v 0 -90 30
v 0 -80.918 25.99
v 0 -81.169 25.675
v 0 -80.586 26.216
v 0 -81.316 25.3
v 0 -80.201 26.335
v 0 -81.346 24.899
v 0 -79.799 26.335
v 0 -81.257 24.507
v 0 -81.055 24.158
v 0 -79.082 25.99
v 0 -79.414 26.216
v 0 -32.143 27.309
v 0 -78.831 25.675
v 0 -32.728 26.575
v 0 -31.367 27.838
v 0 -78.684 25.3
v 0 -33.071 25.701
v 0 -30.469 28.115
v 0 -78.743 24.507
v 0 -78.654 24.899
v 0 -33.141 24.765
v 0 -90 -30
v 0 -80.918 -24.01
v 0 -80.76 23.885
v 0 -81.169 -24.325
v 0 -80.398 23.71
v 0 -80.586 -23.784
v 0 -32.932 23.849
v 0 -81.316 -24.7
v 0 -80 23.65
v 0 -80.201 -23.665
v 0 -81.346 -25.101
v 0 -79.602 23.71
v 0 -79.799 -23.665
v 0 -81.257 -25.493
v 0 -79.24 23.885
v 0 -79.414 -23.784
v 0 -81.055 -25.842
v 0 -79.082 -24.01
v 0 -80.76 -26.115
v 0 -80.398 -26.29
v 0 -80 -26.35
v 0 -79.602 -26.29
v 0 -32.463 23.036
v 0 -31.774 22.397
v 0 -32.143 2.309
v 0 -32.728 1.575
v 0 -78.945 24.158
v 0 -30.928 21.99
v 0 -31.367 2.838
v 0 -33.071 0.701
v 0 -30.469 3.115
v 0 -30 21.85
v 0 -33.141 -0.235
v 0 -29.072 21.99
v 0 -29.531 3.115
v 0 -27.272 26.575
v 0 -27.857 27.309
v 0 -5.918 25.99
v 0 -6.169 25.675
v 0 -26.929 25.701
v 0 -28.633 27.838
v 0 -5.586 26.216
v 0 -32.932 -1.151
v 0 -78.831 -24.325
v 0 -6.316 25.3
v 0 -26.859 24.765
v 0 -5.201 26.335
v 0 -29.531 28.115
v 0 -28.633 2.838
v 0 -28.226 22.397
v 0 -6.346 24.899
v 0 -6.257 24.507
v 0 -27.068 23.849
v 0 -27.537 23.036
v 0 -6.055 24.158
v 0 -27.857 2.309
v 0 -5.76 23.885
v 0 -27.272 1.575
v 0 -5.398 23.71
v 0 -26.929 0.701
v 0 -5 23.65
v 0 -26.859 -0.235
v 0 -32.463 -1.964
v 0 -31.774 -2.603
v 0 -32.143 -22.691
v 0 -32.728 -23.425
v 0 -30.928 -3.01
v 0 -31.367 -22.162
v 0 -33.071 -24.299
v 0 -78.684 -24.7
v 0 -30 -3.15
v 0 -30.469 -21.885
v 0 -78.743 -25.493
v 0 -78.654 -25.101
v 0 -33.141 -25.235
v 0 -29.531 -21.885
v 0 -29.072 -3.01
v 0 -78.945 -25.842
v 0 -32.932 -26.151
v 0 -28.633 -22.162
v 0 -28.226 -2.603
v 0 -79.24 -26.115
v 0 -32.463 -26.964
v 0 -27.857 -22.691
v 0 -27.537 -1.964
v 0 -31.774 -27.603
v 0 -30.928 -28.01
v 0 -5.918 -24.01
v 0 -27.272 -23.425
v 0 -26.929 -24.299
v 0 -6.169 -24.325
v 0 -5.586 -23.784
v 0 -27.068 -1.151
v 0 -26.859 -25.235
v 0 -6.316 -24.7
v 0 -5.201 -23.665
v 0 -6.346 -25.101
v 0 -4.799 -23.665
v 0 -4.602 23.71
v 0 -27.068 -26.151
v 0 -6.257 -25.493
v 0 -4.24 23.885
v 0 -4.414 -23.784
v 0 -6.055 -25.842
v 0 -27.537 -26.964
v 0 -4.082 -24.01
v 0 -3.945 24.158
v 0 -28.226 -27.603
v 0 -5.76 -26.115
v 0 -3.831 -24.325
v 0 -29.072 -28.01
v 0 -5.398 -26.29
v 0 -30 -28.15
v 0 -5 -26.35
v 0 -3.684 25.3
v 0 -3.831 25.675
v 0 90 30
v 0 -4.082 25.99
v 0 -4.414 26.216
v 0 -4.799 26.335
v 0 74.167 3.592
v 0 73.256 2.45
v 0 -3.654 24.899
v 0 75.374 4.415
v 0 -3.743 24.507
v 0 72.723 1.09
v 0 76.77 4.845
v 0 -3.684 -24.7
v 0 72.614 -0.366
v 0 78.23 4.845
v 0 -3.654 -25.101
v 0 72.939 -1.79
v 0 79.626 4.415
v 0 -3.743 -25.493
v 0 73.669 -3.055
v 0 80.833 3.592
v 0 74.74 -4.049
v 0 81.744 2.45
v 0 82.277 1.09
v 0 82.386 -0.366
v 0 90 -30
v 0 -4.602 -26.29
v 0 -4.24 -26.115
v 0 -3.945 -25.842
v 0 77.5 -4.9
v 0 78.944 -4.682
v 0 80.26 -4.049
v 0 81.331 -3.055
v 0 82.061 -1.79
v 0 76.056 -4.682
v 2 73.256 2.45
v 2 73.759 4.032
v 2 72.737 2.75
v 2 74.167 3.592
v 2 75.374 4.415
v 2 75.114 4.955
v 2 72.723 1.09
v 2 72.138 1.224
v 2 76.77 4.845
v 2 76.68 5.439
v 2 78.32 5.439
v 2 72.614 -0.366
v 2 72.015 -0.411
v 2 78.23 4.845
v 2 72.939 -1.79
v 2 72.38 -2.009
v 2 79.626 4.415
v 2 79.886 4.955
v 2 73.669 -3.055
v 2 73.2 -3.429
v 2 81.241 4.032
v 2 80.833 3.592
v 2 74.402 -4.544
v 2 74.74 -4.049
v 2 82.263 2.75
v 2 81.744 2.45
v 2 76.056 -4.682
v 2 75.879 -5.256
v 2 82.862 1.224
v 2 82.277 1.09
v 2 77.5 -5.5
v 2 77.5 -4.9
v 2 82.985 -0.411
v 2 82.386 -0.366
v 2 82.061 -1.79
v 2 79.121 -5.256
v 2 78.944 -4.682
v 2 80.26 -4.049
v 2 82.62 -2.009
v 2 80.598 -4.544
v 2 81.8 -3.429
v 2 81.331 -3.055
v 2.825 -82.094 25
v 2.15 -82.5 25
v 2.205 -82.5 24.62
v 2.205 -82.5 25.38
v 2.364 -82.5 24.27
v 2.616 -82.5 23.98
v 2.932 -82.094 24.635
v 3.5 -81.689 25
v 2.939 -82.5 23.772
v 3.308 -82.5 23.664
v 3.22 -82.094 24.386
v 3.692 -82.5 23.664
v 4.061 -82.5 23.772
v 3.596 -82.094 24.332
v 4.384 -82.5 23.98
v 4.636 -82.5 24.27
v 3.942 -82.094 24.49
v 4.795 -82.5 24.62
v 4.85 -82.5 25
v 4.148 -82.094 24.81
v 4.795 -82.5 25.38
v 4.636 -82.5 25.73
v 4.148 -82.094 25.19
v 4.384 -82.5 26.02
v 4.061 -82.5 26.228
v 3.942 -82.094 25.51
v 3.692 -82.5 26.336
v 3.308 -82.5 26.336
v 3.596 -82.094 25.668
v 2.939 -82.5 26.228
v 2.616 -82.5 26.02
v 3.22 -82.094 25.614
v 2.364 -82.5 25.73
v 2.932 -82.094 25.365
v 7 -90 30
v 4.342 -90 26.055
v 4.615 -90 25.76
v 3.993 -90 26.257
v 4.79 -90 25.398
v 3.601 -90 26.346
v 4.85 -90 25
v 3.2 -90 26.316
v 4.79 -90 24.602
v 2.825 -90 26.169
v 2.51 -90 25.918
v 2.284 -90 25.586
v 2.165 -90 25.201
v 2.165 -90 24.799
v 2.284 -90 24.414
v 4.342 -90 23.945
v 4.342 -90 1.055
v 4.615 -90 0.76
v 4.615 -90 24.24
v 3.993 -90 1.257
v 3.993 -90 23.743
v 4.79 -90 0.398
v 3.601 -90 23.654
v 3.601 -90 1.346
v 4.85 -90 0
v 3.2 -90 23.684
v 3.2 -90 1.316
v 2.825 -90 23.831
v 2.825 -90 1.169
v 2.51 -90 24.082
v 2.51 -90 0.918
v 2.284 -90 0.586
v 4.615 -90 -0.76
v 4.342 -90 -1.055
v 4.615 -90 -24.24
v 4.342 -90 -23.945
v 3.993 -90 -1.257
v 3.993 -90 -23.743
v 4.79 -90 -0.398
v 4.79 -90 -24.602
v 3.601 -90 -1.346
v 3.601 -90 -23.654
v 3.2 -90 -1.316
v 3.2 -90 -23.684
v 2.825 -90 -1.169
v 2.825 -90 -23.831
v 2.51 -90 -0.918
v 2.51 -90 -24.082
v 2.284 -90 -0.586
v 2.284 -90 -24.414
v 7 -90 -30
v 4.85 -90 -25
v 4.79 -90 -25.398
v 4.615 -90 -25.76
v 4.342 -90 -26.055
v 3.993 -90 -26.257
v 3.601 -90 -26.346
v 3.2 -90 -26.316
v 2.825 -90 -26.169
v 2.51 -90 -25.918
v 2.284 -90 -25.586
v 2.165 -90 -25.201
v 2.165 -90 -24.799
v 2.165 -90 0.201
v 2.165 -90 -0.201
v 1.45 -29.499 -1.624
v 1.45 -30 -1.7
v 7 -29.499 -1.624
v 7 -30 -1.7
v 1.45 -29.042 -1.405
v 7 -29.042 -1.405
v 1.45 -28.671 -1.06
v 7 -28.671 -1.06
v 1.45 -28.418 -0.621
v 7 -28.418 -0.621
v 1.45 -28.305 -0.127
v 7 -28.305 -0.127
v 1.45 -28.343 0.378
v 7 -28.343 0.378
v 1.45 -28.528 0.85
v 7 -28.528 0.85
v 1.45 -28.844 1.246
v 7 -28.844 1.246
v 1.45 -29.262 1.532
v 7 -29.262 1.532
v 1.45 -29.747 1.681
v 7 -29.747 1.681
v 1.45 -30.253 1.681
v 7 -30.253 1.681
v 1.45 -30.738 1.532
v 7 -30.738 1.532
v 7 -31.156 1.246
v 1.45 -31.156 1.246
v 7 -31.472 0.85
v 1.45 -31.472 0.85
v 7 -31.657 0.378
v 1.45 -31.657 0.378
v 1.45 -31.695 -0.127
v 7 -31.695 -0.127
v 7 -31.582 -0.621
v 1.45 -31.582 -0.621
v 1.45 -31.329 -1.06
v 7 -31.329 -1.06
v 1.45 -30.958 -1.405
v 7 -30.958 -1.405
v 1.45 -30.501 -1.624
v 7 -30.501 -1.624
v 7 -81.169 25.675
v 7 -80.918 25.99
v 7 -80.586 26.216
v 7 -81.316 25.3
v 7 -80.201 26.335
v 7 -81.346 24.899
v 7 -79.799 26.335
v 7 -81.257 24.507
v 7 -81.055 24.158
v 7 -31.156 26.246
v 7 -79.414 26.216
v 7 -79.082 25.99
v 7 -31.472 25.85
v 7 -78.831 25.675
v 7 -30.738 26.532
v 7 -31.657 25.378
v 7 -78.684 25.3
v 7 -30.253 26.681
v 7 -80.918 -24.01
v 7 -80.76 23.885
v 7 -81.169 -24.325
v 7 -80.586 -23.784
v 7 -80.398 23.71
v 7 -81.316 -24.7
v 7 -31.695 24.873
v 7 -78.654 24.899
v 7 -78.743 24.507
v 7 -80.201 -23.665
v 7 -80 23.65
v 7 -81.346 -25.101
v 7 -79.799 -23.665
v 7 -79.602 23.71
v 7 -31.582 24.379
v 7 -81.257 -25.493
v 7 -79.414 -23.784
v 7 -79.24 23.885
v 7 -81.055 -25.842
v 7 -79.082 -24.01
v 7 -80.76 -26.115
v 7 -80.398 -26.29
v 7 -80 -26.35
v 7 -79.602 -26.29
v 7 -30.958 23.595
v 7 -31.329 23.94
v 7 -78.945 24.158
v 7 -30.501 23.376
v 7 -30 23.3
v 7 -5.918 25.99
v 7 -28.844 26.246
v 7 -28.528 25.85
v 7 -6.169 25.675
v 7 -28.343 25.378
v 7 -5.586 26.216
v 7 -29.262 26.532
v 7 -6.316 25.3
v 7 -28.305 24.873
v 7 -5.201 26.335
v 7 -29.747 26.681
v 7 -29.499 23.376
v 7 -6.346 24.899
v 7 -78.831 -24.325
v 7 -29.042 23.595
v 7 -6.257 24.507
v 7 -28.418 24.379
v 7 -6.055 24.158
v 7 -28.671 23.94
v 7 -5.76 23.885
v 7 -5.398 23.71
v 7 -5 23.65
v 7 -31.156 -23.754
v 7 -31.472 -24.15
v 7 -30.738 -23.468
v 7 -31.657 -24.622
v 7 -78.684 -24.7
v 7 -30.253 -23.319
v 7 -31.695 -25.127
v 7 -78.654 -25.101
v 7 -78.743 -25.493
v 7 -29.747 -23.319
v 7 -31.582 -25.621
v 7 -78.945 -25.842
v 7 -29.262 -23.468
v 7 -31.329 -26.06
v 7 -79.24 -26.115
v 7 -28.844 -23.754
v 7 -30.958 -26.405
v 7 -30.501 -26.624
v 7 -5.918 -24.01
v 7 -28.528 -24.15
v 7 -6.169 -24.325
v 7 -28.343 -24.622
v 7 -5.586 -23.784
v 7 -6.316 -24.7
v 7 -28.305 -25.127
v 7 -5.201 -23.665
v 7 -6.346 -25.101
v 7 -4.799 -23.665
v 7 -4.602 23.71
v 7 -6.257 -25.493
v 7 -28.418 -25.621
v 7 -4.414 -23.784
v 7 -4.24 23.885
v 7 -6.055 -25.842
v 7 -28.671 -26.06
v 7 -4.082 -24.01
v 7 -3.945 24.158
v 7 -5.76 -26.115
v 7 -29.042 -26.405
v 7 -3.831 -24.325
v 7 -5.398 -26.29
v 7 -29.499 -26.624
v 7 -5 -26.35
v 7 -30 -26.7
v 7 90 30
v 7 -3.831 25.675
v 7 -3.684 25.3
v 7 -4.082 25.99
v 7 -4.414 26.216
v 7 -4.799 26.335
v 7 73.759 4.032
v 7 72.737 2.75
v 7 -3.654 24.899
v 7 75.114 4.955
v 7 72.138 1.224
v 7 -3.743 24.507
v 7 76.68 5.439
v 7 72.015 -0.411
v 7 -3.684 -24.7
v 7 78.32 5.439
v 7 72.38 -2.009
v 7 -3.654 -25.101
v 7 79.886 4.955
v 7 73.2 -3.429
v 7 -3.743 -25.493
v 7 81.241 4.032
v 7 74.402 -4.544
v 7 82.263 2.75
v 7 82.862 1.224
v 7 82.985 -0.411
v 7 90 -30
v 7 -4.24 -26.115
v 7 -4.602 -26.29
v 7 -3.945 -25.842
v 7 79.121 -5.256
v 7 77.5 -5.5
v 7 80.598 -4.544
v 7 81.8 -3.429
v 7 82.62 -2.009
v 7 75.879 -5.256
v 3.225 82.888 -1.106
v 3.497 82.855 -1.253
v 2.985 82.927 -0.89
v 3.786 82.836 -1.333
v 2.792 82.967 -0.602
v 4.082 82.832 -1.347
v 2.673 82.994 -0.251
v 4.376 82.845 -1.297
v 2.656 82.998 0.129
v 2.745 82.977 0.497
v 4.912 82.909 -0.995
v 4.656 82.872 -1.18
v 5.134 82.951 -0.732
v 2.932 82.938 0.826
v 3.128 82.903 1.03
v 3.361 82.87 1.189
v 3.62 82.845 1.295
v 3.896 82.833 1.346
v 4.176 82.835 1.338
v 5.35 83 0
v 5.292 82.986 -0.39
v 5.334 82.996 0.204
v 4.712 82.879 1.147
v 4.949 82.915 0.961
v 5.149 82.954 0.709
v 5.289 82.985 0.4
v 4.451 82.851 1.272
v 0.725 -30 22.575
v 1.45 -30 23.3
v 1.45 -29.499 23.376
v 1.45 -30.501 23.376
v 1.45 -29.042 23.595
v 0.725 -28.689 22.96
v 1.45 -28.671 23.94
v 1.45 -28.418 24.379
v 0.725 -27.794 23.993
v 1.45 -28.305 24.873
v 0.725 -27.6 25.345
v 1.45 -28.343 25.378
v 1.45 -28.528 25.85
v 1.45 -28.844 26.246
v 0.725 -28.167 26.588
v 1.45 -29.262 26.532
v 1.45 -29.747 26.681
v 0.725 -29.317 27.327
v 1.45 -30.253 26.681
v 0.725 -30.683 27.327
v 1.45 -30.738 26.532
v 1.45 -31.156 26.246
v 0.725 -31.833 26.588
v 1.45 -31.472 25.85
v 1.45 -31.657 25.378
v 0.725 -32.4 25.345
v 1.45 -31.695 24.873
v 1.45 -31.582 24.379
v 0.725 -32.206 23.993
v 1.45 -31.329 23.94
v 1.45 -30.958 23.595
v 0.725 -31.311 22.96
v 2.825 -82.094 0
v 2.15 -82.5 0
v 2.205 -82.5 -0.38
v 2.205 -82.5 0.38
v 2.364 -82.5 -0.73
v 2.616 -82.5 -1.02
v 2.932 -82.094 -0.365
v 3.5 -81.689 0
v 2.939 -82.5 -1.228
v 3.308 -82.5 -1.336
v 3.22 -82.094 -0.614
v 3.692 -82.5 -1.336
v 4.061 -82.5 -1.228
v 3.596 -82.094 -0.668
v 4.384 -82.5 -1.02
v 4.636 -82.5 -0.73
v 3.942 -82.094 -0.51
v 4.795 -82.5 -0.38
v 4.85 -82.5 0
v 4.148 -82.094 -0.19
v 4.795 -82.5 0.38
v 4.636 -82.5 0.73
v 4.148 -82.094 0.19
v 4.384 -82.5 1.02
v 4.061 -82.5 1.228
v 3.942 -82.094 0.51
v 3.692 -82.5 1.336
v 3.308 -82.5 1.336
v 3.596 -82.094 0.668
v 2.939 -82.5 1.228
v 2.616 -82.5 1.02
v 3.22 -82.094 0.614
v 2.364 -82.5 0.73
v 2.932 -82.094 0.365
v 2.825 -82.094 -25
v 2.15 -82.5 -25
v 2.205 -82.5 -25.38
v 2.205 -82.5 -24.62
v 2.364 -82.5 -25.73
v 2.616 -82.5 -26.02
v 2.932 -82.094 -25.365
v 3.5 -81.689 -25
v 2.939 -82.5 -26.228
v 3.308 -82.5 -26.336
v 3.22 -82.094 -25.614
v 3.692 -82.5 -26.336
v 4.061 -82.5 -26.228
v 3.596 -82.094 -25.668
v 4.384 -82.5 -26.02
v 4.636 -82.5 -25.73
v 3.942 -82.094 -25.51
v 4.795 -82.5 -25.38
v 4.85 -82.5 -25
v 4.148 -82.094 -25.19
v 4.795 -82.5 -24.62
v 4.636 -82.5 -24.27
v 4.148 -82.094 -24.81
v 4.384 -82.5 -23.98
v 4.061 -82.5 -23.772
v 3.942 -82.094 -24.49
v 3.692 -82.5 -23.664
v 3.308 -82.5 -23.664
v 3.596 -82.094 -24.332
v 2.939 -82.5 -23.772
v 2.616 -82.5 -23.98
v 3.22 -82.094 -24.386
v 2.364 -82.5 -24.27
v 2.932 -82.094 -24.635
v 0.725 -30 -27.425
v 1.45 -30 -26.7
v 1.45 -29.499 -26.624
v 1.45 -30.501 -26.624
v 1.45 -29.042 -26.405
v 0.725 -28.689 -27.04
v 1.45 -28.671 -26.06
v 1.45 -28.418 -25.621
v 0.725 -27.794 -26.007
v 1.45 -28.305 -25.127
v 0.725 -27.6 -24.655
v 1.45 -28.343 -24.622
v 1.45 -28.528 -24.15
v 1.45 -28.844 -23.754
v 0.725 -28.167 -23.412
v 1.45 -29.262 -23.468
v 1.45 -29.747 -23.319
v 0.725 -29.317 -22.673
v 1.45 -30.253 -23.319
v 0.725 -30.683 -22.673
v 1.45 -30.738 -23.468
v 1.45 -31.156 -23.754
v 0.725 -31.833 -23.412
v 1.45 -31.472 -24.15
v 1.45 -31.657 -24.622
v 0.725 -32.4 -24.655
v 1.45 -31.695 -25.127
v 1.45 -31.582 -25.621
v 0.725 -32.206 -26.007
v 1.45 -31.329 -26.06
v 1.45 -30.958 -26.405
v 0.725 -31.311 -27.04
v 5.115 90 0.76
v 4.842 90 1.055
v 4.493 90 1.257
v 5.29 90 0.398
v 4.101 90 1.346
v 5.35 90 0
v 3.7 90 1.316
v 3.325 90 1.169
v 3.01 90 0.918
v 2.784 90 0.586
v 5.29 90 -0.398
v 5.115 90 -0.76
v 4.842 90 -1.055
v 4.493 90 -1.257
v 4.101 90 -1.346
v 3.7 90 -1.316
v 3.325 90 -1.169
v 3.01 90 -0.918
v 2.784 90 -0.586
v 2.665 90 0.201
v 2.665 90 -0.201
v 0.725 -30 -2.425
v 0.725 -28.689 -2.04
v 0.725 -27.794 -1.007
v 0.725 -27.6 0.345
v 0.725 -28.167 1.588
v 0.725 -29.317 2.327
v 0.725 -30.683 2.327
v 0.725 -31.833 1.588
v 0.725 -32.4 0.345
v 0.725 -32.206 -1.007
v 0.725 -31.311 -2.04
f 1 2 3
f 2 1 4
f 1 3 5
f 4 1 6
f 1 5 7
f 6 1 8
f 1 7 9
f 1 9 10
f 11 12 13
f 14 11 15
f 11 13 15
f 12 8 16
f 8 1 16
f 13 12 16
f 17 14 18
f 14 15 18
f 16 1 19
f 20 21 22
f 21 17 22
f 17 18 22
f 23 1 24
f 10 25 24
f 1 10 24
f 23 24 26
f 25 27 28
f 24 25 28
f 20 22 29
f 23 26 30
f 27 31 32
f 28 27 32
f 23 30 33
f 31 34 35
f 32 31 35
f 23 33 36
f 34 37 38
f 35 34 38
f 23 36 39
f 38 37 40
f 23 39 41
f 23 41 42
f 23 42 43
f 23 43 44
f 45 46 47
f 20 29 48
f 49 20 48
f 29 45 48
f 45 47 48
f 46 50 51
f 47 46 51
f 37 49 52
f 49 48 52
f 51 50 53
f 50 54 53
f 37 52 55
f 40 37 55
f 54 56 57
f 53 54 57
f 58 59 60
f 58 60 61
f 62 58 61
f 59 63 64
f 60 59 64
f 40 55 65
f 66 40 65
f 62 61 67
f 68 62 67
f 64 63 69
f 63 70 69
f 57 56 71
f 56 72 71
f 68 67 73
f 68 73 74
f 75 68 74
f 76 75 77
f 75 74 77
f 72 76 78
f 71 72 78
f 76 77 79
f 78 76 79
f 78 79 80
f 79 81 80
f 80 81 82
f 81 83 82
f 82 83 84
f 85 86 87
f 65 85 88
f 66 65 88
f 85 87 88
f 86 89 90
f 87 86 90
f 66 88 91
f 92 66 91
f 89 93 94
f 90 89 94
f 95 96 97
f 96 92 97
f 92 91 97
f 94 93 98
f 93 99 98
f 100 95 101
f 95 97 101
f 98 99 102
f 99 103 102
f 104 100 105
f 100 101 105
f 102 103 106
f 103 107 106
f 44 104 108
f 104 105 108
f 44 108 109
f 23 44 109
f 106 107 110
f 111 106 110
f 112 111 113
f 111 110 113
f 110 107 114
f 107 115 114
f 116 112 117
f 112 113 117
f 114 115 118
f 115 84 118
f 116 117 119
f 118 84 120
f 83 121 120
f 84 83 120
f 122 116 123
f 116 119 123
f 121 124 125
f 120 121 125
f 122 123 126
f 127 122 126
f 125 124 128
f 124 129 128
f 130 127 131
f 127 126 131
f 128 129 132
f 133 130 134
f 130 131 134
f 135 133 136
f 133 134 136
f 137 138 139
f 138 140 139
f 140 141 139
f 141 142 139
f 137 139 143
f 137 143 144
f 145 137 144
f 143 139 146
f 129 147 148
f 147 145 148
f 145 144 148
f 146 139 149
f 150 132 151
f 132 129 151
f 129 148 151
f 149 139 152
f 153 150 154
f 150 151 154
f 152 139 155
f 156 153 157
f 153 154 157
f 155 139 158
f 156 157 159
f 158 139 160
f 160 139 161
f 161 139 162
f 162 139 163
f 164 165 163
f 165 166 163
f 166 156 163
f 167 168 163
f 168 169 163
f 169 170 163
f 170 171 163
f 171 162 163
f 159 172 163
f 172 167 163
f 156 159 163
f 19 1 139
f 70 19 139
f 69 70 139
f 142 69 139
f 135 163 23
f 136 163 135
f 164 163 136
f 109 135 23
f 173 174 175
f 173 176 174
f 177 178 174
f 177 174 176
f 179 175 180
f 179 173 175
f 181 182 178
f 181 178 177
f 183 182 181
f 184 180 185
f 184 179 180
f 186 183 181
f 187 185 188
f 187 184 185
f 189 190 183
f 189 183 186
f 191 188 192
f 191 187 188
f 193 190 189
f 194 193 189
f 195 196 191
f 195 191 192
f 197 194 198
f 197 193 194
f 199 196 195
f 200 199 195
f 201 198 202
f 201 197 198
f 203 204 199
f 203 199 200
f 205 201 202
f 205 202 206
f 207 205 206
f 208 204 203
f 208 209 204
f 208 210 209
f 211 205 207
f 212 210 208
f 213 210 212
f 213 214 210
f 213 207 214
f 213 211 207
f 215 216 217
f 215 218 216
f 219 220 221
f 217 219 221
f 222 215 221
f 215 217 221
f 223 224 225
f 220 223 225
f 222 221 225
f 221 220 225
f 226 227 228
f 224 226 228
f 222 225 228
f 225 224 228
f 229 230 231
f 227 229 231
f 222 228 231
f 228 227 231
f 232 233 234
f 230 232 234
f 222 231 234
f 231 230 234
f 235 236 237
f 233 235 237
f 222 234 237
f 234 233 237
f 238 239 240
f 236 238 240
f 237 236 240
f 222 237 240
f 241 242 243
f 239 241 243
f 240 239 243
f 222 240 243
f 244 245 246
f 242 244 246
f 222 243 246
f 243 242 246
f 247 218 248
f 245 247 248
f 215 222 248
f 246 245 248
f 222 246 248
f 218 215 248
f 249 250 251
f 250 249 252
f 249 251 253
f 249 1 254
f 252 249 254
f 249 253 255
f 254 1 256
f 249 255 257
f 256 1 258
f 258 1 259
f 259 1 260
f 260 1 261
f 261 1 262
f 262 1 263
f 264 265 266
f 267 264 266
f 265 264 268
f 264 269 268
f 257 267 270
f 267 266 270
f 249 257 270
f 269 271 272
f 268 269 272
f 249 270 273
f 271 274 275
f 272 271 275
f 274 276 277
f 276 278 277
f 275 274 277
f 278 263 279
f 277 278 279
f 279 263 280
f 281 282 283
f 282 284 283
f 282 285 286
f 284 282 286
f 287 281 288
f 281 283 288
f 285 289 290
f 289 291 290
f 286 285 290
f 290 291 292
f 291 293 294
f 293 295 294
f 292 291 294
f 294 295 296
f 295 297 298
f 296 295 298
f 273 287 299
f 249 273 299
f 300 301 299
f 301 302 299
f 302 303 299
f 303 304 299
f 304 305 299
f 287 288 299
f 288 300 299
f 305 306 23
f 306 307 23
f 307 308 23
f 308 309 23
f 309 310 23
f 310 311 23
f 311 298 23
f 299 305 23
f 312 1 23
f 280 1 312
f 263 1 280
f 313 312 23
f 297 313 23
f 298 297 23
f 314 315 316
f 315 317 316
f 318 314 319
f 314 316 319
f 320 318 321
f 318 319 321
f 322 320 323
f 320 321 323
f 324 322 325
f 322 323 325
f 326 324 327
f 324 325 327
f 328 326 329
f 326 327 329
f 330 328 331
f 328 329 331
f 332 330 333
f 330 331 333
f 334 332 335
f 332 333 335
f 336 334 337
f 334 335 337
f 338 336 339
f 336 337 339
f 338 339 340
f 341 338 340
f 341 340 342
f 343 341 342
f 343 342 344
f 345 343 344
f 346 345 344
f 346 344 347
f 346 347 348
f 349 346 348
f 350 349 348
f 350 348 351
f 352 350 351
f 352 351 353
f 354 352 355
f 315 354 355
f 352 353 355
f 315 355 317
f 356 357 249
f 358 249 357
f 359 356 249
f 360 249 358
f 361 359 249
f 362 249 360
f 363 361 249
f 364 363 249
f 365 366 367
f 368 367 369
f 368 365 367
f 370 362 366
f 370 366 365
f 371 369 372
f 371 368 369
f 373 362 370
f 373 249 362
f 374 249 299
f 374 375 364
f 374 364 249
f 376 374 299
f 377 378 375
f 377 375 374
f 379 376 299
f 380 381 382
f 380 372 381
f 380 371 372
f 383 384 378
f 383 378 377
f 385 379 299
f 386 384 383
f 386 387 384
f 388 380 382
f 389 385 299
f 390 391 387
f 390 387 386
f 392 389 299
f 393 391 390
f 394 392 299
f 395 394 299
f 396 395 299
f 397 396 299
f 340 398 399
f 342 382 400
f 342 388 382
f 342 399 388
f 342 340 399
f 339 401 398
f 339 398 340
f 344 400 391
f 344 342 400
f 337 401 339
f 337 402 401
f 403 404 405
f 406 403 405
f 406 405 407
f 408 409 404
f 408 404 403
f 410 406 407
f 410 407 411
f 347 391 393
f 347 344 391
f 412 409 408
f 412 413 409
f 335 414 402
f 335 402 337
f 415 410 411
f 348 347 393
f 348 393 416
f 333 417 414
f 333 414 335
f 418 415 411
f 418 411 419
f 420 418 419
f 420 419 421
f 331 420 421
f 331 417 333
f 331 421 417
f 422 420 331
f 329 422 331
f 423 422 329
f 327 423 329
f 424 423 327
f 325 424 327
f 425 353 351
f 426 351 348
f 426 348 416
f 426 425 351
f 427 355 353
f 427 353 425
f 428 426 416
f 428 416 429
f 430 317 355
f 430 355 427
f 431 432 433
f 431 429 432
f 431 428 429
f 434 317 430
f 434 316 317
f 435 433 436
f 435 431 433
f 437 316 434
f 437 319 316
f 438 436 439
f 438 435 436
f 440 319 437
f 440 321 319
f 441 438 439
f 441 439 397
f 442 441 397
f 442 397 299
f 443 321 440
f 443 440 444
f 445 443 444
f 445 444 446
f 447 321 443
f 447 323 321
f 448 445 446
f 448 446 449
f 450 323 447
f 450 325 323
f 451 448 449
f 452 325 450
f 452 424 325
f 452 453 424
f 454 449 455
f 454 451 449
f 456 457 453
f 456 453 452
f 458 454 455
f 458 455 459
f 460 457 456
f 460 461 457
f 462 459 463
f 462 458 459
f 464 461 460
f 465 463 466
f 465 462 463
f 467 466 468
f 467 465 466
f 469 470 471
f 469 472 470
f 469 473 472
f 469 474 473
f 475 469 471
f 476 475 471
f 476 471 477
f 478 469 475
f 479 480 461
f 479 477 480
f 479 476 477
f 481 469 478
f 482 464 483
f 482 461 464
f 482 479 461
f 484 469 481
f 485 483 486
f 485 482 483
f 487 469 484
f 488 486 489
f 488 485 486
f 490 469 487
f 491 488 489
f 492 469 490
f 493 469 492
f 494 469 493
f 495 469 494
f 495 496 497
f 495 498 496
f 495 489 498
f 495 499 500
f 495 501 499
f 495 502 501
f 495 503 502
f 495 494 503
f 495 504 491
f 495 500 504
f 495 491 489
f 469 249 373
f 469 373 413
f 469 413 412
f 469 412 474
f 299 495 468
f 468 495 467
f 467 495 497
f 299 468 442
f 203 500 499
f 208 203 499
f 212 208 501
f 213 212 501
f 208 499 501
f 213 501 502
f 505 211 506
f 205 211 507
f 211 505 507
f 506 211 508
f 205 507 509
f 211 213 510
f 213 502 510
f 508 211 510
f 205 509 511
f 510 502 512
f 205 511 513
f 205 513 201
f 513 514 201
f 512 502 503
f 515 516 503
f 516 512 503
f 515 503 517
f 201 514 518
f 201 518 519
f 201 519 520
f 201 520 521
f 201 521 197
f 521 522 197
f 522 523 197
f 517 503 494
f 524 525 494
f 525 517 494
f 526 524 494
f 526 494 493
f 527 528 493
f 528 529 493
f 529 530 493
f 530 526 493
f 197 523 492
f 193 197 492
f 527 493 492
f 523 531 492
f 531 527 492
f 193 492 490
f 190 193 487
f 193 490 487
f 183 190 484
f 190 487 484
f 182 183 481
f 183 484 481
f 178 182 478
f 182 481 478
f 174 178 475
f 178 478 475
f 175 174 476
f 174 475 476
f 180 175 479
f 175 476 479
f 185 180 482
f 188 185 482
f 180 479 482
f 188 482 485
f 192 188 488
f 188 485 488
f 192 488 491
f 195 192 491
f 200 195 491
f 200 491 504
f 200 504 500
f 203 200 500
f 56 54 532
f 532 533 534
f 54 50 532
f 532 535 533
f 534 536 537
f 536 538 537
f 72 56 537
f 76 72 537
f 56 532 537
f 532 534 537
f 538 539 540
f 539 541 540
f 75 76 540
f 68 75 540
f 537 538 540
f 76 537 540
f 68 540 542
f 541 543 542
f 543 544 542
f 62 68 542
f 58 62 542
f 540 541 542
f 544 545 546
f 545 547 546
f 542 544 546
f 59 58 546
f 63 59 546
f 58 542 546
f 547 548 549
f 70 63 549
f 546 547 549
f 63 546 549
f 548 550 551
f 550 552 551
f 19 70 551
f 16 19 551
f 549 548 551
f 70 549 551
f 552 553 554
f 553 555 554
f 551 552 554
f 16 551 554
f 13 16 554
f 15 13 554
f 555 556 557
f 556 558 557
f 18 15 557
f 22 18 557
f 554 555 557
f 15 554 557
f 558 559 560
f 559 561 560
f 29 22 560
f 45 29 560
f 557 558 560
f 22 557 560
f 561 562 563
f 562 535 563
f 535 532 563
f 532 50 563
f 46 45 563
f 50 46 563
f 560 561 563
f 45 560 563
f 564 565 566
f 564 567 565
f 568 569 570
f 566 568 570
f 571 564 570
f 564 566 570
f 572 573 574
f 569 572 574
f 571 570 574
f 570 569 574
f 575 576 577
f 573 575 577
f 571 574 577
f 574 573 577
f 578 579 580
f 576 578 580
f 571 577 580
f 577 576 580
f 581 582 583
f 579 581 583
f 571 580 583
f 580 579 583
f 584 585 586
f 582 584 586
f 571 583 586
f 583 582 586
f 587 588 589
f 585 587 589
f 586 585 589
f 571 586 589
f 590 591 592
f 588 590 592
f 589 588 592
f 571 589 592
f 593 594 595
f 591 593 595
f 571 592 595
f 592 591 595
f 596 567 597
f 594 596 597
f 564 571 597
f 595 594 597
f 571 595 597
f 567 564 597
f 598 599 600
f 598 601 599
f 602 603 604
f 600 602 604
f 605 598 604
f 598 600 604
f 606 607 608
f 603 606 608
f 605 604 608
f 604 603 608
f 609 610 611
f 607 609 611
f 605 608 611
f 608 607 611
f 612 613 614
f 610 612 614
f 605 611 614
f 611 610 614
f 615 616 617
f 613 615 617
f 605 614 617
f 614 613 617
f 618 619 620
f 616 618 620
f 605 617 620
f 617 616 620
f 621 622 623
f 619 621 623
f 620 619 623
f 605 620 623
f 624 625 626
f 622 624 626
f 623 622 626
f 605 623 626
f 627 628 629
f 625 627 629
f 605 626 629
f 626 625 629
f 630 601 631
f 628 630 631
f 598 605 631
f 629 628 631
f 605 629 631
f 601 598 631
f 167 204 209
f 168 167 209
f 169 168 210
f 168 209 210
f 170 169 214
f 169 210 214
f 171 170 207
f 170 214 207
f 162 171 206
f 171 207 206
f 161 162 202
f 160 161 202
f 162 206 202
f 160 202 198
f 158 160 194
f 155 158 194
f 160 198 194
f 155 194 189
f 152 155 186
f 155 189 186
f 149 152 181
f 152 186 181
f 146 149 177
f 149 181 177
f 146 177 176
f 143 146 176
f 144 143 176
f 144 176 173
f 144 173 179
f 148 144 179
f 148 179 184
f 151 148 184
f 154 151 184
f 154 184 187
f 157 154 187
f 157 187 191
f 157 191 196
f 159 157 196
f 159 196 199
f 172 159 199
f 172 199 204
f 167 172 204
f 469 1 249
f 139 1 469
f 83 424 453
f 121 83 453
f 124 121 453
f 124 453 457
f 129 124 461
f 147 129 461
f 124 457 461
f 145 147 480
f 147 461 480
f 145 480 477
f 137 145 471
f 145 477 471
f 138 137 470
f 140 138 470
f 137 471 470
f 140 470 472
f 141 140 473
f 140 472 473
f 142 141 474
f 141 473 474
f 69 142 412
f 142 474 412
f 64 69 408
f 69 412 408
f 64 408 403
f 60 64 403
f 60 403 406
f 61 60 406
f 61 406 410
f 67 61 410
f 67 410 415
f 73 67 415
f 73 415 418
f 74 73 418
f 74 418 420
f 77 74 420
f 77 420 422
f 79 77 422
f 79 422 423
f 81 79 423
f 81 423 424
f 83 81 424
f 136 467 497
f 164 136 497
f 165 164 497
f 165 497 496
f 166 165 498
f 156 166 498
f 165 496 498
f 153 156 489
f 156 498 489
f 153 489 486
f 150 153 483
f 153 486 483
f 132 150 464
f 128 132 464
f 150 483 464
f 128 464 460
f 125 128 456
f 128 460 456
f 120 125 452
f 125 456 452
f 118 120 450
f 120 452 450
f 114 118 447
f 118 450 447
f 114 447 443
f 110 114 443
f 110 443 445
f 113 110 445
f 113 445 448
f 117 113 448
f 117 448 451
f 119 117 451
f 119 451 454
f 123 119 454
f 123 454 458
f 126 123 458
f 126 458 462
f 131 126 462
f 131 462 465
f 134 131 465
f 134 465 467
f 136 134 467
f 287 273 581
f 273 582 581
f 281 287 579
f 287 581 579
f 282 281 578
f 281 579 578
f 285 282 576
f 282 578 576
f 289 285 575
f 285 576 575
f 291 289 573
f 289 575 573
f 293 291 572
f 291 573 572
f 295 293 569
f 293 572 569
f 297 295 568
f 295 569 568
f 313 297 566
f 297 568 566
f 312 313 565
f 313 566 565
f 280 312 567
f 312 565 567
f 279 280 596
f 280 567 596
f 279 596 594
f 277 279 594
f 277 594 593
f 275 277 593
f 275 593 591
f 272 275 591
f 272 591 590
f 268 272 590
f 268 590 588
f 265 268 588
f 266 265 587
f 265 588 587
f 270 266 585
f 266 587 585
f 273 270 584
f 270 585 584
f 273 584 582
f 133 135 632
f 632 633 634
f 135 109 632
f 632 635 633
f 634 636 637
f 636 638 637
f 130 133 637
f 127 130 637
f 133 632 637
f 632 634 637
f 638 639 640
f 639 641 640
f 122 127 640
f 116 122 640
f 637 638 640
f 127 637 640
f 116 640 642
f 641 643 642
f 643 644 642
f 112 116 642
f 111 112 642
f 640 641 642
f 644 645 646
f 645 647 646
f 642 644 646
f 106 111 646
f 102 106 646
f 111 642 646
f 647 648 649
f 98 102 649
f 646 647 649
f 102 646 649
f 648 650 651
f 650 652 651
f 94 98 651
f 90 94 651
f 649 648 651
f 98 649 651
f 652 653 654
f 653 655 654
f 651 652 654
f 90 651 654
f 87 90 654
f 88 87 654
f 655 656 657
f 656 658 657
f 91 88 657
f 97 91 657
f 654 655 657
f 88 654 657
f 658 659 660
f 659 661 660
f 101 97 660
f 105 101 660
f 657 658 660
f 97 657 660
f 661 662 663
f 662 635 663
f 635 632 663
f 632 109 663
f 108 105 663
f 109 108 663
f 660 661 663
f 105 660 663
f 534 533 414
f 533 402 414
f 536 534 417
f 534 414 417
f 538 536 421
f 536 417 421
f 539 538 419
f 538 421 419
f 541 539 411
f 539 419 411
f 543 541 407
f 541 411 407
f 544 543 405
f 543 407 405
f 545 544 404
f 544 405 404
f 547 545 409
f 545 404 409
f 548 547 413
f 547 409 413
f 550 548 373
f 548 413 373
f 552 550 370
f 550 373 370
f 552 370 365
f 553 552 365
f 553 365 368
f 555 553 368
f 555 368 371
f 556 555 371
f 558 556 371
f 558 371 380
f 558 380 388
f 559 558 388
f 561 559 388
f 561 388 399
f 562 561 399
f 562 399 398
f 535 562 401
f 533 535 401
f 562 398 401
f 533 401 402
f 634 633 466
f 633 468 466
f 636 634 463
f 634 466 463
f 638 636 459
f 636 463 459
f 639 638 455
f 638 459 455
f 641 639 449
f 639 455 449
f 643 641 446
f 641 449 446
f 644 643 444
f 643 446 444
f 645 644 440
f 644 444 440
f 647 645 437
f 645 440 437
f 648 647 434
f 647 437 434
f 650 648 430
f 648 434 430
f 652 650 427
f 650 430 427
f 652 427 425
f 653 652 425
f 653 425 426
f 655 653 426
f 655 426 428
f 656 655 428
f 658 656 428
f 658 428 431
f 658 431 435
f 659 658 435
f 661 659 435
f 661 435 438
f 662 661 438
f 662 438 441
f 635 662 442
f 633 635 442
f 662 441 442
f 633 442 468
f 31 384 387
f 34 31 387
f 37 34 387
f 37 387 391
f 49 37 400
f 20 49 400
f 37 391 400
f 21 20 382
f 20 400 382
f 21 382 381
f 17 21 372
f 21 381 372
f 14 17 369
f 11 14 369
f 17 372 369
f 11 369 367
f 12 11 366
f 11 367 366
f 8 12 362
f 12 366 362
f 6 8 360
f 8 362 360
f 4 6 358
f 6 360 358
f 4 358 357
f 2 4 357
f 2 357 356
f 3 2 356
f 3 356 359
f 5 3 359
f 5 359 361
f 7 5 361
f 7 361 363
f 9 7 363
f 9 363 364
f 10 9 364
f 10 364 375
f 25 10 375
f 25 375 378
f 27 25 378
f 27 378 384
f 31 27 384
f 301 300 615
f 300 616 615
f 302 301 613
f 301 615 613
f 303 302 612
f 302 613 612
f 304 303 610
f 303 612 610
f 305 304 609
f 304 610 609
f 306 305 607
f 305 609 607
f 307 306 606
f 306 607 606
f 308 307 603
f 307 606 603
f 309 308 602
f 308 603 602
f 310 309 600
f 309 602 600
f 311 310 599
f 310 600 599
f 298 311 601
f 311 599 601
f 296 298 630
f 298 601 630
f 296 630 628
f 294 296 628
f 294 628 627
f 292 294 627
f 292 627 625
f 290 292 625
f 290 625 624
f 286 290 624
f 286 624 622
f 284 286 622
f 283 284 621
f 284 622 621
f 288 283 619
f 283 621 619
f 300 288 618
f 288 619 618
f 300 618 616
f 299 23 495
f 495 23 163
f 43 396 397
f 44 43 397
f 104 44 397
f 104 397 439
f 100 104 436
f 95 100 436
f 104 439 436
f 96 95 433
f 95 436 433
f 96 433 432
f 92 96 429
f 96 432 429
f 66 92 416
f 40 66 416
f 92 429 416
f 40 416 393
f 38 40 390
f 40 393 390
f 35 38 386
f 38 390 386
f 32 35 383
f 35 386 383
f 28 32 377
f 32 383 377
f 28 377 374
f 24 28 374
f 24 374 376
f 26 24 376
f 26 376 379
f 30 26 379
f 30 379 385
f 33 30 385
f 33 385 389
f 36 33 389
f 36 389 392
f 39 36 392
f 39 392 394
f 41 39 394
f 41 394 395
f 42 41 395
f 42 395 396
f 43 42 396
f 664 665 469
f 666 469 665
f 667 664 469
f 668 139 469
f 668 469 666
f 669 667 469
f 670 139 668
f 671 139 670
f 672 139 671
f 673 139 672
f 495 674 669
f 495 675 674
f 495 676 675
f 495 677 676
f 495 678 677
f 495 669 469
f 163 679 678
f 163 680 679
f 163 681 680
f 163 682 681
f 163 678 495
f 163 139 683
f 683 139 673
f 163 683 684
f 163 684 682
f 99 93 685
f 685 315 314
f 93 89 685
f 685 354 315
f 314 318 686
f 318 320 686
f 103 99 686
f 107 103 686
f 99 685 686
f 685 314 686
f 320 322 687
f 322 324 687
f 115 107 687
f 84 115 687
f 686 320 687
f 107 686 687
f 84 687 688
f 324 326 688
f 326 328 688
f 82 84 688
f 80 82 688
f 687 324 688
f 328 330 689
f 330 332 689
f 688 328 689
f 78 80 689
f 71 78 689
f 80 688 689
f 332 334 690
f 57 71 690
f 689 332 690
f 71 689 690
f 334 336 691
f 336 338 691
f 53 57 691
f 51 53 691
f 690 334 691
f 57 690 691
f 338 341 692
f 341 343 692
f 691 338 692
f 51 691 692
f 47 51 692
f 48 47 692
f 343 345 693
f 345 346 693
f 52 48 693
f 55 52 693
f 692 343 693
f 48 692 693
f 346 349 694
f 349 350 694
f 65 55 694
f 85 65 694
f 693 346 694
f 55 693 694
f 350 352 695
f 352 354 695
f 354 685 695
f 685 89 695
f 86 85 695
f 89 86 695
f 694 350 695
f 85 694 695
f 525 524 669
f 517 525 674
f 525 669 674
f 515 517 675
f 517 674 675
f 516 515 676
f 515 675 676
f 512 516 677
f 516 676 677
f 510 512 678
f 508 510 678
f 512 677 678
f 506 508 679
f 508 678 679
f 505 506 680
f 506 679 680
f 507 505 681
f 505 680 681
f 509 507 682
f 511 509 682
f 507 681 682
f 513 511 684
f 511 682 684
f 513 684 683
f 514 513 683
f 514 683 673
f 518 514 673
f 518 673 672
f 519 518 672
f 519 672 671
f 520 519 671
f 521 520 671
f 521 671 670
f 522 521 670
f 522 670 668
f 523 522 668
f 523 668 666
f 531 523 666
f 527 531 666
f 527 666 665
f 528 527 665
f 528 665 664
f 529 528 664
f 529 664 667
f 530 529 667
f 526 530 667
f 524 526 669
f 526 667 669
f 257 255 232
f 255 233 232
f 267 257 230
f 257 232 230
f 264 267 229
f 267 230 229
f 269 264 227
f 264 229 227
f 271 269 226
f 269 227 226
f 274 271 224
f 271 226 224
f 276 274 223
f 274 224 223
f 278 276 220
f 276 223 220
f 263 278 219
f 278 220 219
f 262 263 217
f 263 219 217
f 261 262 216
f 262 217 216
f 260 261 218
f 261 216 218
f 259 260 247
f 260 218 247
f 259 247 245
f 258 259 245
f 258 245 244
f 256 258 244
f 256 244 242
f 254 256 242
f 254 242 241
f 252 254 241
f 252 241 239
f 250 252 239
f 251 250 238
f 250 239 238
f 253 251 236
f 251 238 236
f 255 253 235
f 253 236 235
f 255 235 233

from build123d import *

# Parameters (mm, degrees)
SKETCH_1_W                   = 60
SKETCH_1_H                   = 180
EXTRUDE_1_DEPTH              = 7
SKETCH_2_R                   = 5.5
CUT_EXTRUDE_1_DEPTH          = 5
SKETCH_3_R                   = 4.9
CUT_EXTRUDE_2_DEPTH          = 96
HOLE_WIZARD_M3_1_D           = 3.4
HOLE_WIZARD_M3_1_DEPTH       = 7.5
HOLE_WIZARD_M3_1_CSINK_D     = 6.3
HOLE_WIZARD_M3_1_CSINK_ANGLE = 90
HOLE_WIZARD_M3_1_TIP         = 1.021463052
F_1_0MM_3_REACH              = 184.617
F_1_0MM_3_BORE_R             = 1.35
F_1_0MM_2_D                  = 2.7
F_1_0MM_2_DEPTH              = 7.5
F_1_0MM_2_TIP                = 0.811161836
F_1_0MM_1_D                  = 2.7


with BuildPart() as part:
    # 草圖1 → 填料-伸長1 (new body)
    with BuildSketch(Plane(origin=(0, 0, 0), x_dir=(0, 0, -1), z_dir=(1, 0, 0))):
        Rectangle(SKETCH_1_W, SKETCH_1_H)
    extrude(amount=EXTRUDE_1_DEPTH)

    # 草圖2 → 除料-伸長1 (cut)
    with BuildSketch(Plane(origin=(7, 0, 0), x_dir=(0, 0, -1), z_dir=(1, 0, 0))):
        with Locations((0, 77.5)):
            Circle(SKETCH_2_R)
    extrude(amount=-CUT_EXTRUDE_1_DEPTH, mode=Mode.SUBTRACT)

    # 草圖3 → 除料-伸長2 (cut, through all)
    with BuildSketch(Plane(origin=(2, 0, 0), x_dir=(0, 0, -1), z_dir=(1, 0, 0))):
        with Locations((0, 77.5)):
            Circle(SKETCH_3_R)
    extrude(amount=-CUT_EXTRUDE_2_DEPTH, mode=Mode.SUBTRACT)

    # M3 錐坑平頭螺釘的錐孔1
    with Locations(Plane.ZY):
        with Locations((-25, -30), (0, -30), (25, -30)):
            CounterSinkHole(HOLE_WIZARD_M3_1_D / 2, HOLE_WIZARD_M3_1_CSINK_D / 2, depth=HOLE_WIZARD_M3_1_DEPTH, counter_sink_angle=HOLE_WIZARD_M3_1_CSINK_ANGLE)
            with Locations((0, 0, -(HOLE_WIZARD_M3_1_DEPTH + HOLE_WIZARD_M3_1_TIP / 2))):  # 118° drill point
                Cone(0, HOLE_WIZARD_M3_1_D / 2, HOLE_WIZARD_M3_1_TIP, mode=Mode.SUBTRACT)

    # Ø1.0mm 定位孔3 bore → Ø1.0mm 定位孔3 (cut, up to next)
    with BuildSketch(Plane(origin=(0, 90, 0), x_dir=(1, 0, 0), z_dir=(0, 1, 0)), mode=Mode.PRIVATE) as f_1_0mm_3_sk1:
        with Locations((4, 0)):
            Circle(F_1_0MM_3_BORE_R)
    f_1_0mm_3_tool1 = extrude(f_1_0mm_3_sk1.sketch, amount=-F_1_0MM_3_REACH, mode=Mode.PRIVATE) & part.part
    add(f_1_0mm_3_tool1.solids().sort_by_distance((4, 90, 0))[0], mode=Mode.SUBTRACT)

    # Ø1.0mm 定位孔2
    with Locations(Plane(origin=(0, -90, 0), x_dir=(-1, 0, 0), z_dir=(0, -1, 0))):
        with Locations((-3.5, 25), (-3.5, 0), (-3.5, -25)):
            Hole(F_1_0MM_2_D / 2, depth=F_1_0MM_2_DEPTH)
            with Locations((0, 0, -(F_1_0MM_2_DEPTH + F_1_0MM_2_TIP / 2))):  # 118° drill point
                Cone(0, F_1_0MM_2_D / 2, F_1_0MM_2_TIP, mode=Mode.SUBTRACT)

    # Ø1.0mm 定位孔1 (through all)
    with Locations(Plane.ZY):
        with Locations((25, -5), (25, -80), (-25, -80), (-25, -5)):
            Hole(F_1_0MM_1_D / 2)


solid = part.part
